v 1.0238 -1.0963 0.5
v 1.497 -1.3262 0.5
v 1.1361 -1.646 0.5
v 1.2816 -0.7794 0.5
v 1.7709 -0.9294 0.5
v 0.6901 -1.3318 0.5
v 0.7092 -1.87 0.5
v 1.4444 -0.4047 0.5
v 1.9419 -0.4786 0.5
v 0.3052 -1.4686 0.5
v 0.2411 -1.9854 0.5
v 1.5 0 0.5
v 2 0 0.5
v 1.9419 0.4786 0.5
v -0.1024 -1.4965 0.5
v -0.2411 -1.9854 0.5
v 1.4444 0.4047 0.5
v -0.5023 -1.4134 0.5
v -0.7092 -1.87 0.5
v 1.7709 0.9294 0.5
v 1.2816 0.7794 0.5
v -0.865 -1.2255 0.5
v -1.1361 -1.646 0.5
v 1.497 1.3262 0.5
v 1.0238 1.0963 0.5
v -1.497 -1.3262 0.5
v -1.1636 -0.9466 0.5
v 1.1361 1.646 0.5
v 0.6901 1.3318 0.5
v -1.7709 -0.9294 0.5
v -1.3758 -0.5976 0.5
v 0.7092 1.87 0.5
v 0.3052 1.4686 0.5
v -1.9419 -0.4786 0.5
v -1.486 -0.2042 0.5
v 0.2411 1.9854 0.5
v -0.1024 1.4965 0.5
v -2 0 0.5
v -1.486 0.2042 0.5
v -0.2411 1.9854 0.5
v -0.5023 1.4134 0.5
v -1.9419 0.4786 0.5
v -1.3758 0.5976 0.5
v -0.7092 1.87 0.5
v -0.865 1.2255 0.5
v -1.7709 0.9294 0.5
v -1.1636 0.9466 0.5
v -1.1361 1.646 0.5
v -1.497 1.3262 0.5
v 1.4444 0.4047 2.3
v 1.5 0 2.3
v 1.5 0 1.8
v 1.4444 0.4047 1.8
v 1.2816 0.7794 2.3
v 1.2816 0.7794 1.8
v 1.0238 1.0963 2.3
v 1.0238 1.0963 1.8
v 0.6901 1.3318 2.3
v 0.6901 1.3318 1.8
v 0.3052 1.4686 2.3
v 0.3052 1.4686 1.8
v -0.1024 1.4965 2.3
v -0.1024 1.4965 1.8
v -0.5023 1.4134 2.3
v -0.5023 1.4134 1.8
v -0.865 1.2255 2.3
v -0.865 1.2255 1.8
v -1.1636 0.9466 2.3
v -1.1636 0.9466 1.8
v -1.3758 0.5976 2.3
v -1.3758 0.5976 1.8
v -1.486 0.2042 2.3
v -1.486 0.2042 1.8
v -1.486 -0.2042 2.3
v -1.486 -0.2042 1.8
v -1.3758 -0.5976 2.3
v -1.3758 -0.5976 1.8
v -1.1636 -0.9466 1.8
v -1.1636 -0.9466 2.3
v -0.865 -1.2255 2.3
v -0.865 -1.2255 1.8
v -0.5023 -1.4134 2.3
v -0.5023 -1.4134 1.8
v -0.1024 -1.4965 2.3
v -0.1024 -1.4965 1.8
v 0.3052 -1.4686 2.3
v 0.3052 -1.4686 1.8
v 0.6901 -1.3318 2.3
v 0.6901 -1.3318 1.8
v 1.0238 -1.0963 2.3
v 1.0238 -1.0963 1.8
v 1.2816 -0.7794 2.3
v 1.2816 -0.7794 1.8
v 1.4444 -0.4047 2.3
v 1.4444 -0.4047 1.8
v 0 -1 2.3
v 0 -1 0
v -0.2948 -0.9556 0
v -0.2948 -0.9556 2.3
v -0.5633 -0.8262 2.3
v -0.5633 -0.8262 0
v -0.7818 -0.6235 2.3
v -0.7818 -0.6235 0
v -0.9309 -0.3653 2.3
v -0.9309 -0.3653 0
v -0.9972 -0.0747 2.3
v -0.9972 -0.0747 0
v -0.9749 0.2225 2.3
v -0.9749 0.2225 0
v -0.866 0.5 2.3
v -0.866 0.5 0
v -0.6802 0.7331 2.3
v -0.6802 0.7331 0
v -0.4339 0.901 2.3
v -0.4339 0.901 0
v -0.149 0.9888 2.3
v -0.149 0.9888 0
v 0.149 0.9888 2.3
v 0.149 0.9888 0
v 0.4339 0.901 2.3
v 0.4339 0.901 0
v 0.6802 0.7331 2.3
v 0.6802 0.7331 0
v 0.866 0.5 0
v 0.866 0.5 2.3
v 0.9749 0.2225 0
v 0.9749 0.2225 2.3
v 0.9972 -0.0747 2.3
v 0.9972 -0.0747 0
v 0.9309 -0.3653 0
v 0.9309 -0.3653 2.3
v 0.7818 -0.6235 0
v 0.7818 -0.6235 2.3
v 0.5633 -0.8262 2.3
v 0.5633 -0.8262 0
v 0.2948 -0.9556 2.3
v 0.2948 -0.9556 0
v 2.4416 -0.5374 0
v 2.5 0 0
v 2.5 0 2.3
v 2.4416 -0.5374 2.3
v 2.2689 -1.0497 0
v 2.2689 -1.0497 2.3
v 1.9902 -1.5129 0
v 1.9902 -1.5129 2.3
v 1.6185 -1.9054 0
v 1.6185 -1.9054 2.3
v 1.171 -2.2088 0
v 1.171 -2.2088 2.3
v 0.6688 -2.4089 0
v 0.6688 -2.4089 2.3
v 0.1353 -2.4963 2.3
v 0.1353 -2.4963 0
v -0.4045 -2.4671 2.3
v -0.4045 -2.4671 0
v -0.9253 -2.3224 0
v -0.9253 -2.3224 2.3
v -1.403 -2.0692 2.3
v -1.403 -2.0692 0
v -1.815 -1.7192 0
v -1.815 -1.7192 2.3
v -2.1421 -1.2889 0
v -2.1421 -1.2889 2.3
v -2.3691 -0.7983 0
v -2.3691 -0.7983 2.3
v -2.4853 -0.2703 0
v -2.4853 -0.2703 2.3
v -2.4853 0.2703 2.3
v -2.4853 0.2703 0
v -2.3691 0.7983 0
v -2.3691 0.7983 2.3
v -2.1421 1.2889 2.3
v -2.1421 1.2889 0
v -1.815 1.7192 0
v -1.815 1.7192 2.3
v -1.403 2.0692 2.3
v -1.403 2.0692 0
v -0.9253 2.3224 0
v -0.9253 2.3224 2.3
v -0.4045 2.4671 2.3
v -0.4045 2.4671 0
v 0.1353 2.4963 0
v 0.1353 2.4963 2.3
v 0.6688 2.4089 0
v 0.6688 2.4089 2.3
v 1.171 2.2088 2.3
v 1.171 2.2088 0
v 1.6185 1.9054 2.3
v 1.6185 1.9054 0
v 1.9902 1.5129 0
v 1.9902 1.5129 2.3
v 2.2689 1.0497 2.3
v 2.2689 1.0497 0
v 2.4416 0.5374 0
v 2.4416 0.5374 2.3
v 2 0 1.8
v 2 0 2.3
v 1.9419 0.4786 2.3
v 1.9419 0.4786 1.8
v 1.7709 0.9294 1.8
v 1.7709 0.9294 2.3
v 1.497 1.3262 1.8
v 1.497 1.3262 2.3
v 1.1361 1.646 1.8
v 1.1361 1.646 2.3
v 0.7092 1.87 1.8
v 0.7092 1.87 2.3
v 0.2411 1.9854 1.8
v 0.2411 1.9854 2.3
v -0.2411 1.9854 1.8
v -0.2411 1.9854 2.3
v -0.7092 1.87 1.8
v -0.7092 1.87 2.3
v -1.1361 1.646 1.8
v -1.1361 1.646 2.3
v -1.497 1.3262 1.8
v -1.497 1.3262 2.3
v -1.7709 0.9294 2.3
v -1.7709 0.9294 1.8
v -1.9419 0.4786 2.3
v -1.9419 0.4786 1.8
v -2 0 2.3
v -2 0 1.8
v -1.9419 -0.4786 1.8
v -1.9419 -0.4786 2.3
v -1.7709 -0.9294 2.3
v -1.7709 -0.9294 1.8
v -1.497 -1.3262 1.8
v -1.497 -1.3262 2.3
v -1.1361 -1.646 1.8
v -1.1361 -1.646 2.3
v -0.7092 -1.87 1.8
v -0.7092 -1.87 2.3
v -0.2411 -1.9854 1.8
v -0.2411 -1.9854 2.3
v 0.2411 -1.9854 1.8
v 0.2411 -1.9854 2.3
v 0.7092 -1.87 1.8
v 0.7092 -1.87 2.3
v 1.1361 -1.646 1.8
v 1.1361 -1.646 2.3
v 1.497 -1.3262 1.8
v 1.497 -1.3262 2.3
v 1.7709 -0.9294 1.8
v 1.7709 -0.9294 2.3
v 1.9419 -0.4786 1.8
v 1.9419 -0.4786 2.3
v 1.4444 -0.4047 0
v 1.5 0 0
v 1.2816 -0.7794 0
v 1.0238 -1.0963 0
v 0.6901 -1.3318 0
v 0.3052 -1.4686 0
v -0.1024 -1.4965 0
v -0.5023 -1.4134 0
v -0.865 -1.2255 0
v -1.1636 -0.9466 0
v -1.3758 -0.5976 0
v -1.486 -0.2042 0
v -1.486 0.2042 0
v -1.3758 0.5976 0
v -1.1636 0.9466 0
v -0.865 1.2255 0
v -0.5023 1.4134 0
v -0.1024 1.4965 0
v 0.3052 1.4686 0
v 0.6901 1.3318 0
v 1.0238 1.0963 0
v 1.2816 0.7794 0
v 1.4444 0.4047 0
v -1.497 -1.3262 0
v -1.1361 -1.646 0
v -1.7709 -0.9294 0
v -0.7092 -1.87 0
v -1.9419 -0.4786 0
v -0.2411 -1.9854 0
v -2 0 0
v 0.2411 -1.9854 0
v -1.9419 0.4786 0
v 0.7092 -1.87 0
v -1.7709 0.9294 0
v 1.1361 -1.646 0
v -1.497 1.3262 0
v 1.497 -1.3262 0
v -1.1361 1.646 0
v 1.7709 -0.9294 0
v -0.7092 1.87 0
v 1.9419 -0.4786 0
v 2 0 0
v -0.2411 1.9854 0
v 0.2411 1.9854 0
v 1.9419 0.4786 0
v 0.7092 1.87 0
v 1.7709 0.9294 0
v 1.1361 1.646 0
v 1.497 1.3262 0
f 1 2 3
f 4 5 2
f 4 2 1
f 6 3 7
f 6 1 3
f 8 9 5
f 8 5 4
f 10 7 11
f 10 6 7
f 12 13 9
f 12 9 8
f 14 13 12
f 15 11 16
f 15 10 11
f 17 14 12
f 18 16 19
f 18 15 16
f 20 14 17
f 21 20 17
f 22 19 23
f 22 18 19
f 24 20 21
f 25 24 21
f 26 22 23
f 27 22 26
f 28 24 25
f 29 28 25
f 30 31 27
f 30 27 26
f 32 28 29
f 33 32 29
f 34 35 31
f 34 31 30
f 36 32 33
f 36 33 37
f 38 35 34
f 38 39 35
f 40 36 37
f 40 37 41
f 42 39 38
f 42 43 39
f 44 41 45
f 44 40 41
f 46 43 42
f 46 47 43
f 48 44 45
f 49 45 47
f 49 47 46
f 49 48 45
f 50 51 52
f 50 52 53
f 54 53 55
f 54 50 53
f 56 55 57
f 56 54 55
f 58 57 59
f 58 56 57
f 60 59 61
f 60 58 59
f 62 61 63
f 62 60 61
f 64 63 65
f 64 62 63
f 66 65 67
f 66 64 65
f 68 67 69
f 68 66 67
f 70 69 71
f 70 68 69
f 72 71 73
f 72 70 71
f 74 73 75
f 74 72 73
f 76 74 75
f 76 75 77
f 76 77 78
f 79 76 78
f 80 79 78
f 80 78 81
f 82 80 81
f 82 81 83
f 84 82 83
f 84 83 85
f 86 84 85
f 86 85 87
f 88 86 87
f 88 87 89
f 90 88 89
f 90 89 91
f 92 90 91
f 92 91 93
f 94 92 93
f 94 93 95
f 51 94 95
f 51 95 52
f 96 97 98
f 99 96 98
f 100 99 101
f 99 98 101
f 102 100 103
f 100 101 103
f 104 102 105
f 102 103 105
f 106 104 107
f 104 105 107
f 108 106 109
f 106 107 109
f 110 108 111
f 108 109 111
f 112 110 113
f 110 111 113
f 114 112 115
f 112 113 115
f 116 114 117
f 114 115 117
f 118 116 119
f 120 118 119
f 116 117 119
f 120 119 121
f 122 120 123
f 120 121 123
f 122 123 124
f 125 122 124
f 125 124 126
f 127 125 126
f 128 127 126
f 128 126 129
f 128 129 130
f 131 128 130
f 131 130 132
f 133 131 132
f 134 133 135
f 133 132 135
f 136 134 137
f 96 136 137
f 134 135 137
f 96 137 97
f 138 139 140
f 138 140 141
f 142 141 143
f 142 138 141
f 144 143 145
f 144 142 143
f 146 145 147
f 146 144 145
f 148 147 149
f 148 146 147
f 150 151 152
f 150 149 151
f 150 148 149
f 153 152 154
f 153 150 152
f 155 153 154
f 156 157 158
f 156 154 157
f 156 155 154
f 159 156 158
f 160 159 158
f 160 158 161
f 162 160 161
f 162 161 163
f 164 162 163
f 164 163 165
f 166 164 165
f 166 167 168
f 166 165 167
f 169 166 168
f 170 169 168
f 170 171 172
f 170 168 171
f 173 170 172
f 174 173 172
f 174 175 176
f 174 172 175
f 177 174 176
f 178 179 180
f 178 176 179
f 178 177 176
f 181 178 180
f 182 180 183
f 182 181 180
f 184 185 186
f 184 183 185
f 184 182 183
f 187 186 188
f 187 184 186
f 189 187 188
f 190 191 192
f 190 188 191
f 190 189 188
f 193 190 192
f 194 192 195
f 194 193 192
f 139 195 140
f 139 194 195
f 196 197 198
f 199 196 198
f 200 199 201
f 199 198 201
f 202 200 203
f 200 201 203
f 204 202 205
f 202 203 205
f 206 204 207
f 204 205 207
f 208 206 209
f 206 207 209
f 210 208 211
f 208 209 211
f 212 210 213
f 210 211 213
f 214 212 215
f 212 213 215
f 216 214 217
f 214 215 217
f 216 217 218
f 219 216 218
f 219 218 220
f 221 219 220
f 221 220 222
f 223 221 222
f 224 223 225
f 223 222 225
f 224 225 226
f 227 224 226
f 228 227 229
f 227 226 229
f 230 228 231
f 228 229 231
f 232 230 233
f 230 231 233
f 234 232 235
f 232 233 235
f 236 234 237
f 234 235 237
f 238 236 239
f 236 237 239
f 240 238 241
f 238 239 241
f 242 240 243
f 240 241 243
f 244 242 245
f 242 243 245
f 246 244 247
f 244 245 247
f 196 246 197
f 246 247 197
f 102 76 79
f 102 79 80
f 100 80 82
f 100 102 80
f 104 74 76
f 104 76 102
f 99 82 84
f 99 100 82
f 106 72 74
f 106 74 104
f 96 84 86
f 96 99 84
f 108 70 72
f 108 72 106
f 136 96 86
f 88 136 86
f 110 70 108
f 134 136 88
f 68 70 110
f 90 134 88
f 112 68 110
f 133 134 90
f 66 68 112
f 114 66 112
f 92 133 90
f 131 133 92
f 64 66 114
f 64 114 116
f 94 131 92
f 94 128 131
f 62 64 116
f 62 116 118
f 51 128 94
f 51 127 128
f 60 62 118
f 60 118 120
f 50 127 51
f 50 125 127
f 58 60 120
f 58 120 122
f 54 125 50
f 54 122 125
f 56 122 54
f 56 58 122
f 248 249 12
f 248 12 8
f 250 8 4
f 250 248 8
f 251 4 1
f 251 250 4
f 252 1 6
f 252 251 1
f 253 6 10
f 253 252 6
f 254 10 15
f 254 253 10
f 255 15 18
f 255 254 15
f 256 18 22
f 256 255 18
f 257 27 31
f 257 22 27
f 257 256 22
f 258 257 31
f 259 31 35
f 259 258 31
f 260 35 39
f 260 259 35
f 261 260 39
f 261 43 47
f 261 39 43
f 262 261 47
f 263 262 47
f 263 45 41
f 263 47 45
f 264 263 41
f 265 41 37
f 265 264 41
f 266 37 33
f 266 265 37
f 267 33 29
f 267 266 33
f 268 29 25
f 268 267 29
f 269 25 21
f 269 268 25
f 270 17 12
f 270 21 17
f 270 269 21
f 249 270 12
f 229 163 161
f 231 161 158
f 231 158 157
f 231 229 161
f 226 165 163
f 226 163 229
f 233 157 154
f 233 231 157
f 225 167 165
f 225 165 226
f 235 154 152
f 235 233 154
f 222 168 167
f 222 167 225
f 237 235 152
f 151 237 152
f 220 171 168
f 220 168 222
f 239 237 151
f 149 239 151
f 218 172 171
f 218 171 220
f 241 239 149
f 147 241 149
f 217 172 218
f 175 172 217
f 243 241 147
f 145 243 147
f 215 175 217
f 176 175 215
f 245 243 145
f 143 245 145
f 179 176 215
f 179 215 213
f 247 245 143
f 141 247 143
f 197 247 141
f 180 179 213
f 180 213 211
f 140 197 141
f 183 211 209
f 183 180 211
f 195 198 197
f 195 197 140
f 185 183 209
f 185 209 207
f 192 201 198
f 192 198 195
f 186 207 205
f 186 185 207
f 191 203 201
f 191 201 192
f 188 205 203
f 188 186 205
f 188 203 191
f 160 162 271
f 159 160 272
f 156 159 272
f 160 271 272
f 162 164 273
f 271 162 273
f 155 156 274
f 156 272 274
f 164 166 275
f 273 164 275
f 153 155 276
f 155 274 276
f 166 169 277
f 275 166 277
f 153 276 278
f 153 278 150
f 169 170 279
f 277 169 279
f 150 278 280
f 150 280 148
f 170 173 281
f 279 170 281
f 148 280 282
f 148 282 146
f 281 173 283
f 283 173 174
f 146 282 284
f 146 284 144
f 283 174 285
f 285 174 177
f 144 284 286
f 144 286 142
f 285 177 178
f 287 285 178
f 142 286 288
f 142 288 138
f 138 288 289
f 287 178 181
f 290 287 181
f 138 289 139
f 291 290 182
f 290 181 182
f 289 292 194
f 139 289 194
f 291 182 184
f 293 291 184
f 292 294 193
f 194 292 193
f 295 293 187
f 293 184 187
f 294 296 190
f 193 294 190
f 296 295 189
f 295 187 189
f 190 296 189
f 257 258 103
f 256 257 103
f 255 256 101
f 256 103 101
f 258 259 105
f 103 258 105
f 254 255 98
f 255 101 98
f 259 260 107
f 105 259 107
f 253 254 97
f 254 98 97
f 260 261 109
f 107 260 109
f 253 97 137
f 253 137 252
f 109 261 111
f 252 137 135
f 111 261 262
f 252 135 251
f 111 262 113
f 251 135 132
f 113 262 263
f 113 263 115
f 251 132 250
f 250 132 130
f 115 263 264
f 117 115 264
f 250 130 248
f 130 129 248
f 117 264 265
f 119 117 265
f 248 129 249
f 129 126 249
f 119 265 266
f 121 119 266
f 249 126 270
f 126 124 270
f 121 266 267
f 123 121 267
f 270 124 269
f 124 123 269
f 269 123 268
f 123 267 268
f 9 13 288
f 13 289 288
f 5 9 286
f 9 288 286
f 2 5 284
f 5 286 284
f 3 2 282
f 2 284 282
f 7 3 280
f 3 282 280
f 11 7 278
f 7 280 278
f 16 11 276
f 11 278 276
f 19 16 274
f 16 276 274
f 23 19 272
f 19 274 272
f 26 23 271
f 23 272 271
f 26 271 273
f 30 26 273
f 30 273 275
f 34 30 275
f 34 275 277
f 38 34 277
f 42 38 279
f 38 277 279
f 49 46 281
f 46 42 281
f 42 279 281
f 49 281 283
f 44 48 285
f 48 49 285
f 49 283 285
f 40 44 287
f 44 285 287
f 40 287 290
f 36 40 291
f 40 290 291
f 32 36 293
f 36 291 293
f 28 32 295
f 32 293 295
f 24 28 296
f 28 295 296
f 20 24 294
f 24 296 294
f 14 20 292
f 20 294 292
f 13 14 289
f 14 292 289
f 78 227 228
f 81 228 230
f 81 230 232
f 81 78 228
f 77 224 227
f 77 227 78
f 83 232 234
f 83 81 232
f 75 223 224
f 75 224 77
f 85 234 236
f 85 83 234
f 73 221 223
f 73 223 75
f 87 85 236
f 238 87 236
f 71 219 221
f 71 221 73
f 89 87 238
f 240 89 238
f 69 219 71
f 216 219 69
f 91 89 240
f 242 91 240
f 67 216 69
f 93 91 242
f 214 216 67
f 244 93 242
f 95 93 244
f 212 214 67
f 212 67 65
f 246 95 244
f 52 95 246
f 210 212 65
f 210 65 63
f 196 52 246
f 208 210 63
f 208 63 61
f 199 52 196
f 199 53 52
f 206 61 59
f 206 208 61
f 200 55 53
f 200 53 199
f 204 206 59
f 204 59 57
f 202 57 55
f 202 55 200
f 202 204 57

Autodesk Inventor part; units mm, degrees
ref_plane "YZ Plane" through (0, 0, 0) normal (1, 0, 0) x (0, 1, 0)
ref_plane "XZ Plane" through (0, 0, 0) normal (0, 1, 0) x (-1, 0, 0)
sketch "Sketch1" plane through (0, 0, 0) normal (0, 0, 1) x (1, 0, 0)
  circle A0 centre (0, 0) radius 2.5
  dimension "d0" = 5
extrude "Extrusion1" add sketch "Sketch1" along normal blind 2.3
hole "Hole1" at (0, 0, 2.3) direction (0, 0, -1) diameter 2 end through all
sketch "Sketch2" plane through (0, 0, 2.3) normal (0, 0, 1) x (1, 0, 0)
  circle A0 centre (0, 0) radius 2
  circle A1 centre (0, 0) radius 1.5
  dimension "d12" = 4
  dimension "d13" = 3
extrude "Extrusion2" cut sketch "Sketch2" against normal blind 0.5
ref_plane "Work Plane1" through (0, 0, 1.15) normal (0, 0, 1) x (1, 0, 0)
mirror "Mirror1" about plane through (0, 0, 1.15) normal (0, 0, 1) of "Extrusion2"
properties part number "bearing_2x5x2,3" material "Stainless Steel"
